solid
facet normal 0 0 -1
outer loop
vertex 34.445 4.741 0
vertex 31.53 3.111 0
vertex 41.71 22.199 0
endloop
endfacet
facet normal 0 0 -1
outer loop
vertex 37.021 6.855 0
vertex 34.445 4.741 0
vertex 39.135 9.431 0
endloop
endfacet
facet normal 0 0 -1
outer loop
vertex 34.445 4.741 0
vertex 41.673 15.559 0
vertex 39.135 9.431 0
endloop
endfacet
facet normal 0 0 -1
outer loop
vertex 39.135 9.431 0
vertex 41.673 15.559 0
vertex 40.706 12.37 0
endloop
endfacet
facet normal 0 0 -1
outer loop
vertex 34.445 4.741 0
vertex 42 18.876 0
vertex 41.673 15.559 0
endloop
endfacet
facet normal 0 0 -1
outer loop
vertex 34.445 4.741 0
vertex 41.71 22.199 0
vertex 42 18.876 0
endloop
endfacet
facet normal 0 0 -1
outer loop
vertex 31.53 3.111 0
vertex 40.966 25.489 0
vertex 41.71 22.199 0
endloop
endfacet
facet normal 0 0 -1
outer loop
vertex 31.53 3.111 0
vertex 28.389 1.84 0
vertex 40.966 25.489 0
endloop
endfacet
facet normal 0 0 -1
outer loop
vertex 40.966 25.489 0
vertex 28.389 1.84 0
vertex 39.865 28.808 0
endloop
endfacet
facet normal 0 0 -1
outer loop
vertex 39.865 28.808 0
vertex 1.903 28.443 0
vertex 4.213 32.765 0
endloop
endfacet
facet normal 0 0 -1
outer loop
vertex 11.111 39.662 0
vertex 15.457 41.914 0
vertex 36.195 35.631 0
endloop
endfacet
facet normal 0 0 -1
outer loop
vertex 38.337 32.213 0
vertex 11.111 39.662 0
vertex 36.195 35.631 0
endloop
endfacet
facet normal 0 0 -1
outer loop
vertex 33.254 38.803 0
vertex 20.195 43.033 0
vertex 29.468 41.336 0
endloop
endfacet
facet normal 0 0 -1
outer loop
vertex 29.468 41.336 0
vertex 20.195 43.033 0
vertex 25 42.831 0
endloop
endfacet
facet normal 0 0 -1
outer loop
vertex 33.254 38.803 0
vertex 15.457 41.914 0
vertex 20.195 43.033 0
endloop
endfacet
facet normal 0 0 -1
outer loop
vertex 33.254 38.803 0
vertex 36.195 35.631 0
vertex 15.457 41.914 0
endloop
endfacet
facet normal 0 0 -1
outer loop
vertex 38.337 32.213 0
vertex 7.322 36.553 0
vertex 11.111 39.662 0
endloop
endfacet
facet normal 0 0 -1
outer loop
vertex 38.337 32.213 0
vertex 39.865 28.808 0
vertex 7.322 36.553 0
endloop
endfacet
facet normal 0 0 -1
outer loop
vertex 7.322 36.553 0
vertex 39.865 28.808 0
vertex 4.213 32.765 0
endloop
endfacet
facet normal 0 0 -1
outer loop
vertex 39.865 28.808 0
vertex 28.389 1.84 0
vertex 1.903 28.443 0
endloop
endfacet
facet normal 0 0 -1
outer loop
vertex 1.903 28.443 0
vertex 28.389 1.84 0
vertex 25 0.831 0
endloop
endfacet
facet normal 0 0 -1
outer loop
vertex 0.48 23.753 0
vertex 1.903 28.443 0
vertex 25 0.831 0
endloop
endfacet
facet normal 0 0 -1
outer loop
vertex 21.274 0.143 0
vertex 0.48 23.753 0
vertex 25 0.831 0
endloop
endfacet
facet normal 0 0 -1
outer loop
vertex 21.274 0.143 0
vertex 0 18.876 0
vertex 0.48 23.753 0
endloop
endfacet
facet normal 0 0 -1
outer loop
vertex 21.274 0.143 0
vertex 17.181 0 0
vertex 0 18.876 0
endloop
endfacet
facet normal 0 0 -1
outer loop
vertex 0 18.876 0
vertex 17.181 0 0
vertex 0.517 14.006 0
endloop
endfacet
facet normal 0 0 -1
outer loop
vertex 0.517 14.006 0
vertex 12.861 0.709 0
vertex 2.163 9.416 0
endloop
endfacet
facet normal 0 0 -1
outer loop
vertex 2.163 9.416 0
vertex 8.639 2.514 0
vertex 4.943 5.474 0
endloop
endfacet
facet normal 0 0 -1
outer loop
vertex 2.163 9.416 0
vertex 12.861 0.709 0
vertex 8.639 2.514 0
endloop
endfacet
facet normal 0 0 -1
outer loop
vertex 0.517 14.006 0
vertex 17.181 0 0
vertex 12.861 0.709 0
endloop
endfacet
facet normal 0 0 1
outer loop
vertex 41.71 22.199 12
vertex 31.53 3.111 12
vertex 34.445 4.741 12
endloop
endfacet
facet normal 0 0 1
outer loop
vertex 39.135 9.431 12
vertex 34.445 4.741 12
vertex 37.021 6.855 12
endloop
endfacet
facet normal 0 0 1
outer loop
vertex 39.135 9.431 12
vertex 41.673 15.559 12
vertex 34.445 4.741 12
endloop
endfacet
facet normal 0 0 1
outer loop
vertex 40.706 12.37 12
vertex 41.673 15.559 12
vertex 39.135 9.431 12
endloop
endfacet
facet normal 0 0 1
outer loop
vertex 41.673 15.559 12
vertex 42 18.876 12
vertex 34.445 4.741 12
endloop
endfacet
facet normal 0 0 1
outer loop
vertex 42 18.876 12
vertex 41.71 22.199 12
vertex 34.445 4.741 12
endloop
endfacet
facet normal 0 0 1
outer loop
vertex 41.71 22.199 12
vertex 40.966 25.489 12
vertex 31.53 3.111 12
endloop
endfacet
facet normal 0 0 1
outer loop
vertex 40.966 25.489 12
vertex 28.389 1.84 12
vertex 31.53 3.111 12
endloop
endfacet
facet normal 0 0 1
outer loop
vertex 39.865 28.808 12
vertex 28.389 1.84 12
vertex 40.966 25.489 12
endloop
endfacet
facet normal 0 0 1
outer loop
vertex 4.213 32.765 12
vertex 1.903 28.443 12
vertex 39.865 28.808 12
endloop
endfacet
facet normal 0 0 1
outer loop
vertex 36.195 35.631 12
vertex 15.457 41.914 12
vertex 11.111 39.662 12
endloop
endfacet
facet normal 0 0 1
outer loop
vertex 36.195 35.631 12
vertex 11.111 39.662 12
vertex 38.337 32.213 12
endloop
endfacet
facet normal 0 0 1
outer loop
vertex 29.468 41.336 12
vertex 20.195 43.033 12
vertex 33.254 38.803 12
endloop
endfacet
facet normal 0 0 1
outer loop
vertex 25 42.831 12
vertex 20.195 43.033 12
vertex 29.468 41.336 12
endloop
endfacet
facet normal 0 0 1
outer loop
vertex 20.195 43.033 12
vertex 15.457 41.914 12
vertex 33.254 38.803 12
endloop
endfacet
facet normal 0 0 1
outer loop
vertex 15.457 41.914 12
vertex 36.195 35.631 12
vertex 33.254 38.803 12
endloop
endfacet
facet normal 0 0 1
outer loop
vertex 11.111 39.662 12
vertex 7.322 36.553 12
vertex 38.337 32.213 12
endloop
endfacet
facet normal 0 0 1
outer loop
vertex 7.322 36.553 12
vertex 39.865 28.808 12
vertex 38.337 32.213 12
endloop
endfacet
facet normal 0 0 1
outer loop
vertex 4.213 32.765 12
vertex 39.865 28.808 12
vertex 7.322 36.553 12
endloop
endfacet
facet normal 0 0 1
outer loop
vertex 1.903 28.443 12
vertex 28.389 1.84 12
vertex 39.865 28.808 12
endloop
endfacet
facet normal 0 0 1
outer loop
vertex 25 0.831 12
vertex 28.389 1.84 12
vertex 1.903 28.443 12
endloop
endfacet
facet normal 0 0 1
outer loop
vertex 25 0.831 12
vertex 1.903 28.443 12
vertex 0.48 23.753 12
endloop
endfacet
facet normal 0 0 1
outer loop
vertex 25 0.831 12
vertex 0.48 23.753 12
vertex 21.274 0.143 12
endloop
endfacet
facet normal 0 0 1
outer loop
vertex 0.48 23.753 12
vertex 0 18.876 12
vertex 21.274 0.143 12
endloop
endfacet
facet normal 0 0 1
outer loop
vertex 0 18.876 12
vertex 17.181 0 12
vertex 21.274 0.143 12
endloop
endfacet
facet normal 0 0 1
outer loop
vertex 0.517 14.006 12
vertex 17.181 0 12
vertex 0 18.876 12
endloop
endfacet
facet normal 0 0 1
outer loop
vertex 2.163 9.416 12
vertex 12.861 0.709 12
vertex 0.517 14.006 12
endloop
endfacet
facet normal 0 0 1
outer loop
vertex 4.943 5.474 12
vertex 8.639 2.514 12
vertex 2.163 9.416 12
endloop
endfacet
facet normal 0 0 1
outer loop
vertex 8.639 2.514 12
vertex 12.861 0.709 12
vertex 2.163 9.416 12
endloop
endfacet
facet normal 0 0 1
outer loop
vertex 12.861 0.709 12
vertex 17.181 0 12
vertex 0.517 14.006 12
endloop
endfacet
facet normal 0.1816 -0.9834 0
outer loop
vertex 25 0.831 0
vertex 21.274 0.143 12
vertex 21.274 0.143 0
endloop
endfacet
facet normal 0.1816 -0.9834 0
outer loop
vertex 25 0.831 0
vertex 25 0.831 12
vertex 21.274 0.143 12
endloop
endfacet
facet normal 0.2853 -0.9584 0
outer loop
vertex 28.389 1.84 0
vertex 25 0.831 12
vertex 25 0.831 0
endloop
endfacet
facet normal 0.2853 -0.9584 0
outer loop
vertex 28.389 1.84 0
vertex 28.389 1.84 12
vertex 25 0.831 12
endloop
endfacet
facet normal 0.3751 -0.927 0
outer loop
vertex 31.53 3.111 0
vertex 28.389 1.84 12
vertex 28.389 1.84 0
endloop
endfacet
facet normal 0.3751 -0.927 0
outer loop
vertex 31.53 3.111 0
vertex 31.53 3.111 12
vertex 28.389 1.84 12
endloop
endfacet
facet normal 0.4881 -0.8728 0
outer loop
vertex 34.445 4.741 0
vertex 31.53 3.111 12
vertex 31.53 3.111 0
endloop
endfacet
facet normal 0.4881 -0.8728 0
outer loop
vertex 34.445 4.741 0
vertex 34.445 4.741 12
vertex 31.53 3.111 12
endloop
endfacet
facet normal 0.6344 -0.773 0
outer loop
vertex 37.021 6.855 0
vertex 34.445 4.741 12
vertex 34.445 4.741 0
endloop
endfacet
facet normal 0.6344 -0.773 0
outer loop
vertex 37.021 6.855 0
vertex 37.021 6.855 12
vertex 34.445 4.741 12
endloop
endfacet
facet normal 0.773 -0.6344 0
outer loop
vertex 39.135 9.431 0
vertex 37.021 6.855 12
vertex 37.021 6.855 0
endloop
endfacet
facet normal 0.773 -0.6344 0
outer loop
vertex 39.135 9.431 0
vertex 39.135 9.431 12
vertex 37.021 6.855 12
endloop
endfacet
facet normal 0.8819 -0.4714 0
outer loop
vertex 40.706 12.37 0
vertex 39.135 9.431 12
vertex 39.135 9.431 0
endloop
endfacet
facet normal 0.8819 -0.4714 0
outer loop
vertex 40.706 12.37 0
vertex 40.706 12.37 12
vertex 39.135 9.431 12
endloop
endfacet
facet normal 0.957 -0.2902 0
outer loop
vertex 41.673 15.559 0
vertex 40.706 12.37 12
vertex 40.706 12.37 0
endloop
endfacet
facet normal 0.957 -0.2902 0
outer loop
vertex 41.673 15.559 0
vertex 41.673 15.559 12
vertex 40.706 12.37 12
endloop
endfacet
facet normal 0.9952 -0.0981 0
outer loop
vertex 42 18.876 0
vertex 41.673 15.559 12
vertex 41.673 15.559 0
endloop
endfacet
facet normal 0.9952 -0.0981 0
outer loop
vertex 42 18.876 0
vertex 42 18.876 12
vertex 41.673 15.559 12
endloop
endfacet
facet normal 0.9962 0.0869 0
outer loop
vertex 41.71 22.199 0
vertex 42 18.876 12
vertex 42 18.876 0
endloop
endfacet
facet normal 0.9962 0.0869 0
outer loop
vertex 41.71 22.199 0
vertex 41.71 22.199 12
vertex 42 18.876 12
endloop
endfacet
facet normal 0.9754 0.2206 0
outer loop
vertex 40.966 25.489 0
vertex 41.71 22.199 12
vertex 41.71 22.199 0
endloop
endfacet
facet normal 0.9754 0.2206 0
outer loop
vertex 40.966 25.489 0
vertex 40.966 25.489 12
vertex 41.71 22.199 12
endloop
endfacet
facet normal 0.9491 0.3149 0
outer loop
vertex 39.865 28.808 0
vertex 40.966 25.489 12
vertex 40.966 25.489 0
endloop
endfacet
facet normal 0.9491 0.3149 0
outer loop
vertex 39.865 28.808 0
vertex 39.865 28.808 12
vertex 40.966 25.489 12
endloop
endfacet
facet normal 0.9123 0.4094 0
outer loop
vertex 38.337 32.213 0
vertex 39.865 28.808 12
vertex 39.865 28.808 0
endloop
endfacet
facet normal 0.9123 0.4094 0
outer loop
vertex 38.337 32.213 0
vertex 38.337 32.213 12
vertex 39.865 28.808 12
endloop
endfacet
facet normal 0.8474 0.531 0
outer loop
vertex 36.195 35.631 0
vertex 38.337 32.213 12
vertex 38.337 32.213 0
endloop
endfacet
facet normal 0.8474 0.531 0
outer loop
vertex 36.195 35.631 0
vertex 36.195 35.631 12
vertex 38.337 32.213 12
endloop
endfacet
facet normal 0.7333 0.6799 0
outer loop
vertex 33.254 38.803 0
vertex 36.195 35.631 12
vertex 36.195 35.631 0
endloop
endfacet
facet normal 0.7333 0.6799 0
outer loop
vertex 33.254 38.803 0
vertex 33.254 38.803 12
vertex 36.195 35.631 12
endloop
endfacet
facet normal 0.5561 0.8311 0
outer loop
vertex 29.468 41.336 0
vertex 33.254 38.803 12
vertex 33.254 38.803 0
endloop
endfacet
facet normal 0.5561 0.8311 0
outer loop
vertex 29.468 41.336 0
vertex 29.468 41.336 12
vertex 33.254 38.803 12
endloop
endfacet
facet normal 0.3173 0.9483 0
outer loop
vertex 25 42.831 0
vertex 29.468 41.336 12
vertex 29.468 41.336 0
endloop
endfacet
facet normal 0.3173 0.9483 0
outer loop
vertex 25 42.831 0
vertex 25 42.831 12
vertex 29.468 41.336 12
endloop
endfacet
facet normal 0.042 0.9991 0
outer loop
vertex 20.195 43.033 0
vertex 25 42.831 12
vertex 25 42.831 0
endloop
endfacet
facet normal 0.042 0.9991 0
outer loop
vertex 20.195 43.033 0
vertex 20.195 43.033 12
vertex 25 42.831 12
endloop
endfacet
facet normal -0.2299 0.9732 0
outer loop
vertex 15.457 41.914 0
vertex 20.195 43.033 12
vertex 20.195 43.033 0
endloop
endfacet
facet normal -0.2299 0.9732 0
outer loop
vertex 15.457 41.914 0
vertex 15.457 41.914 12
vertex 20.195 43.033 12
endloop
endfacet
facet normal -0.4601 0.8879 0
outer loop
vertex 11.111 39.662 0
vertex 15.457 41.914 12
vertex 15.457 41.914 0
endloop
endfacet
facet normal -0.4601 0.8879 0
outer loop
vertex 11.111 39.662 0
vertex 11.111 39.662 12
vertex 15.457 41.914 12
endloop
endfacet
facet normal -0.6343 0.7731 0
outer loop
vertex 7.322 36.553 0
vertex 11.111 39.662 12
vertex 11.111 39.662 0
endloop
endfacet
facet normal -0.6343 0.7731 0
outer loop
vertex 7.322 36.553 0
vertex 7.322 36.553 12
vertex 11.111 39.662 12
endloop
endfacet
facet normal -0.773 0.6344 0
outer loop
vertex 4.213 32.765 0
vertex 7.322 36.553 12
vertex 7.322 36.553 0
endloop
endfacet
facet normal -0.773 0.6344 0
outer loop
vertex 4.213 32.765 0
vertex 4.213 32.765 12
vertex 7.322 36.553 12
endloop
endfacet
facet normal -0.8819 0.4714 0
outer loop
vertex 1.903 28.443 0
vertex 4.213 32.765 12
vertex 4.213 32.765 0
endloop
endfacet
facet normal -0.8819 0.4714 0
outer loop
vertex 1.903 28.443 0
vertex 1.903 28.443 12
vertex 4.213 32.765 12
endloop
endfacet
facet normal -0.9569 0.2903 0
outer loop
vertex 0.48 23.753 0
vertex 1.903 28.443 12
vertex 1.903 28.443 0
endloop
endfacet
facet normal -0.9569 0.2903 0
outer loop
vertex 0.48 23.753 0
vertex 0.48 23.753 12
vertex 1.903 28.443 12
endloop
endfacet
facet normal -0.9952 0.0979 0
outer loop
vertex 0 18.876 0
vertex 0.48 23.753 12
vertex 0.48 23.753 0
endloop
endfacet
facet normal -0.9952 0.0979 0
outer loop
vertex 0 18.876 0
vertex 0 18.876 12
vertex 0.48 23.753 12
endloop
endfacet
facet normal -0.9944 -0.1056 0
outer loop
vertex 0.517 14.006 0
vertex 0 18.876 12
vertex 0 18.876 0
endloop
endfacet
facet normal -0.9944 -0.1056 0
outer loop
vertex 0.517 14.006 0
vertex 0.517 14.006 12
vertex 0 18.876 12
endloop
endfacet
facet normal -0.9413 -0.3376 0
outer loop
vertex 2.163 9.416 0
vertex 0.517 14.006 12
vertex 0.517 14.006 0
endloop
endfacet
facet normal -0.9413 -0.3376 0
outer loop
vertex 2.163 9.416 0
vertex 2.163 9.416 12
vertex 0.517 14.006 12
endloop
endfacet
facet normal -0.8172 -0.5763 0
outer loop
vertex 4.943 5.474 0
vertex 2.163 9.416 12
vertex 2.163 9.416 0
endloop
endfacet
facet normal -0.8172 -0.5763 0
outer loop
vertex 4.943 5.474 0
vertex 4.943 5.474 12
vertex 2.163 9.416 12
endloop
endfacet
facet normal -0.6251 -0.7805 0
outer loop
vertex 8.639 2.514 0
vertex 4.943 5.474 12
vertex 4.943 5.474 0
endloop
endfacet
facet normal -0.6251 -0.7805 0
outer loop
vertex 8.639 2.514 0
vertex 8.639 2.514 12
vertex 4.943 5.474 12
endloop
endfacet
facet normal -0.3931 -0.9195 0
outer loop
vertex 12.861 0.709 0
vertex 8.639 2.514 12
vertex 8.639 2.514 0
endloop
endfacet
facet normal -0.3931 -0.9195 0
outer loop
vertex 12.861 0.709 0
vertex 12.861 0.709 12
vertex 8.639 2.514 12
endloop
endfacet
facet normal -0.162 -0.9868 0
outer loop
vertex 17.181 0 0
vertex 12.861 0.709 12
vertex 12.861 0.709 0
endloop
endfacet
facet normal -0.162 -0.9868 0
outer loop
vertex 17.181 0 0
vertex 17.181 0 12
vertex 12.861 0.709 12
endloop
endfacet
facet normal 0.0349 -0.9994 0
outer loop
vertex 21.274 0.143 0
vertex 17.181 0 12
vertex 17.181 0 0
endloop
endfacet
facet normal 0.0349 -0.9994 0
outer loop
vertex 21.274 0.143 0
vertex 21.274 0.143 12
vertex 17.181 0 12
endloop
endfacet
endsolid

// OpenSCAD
$fn = 32;

// ----------------------------------------------------------------------
// Cam disc: base radius 17.0 mm, lift 8.0 mm, 32 profile points
// ----------------------------------------------------------------------

// --- parameters (mm) ---
profile_height = 12;      // extrusion height
profile_points = 32;      // points of the closed outline

profile = [[42, 18.876], [41.71, 22.199], [40.966, 25.489], [39.865, 28.808], [38.337, 32.213], [36.195, 35.631], [33.254, 38.803], [29.468, 41.336], [25, 42.831], [20.195, 43.033], [15.457, 41.914], [11.111, 39.662], [7.322, 36.553], [4.213, 32.765], [1.903, 28.443], [0.48, 23.753], [0, 18.876], [0.517, 14.006], [2.163, 9.416], [4.943, 5.474], [8.639, 2.514], [12.861, 0.709], [17.181, 0], [21.274, 0.143], [25, 0.831], [28.389, 1.84], [31.53, 3.111], [34.445, 4.741], [37.021, 6.855], [39.135, 9.431], [40.706, 12.37], [41.673, 15.559]];  // single closed polygon, 32 points, counter clockwise

// --- the one profile operation ---
linear_extrude(height = profile_height) polygon(points = profile);
